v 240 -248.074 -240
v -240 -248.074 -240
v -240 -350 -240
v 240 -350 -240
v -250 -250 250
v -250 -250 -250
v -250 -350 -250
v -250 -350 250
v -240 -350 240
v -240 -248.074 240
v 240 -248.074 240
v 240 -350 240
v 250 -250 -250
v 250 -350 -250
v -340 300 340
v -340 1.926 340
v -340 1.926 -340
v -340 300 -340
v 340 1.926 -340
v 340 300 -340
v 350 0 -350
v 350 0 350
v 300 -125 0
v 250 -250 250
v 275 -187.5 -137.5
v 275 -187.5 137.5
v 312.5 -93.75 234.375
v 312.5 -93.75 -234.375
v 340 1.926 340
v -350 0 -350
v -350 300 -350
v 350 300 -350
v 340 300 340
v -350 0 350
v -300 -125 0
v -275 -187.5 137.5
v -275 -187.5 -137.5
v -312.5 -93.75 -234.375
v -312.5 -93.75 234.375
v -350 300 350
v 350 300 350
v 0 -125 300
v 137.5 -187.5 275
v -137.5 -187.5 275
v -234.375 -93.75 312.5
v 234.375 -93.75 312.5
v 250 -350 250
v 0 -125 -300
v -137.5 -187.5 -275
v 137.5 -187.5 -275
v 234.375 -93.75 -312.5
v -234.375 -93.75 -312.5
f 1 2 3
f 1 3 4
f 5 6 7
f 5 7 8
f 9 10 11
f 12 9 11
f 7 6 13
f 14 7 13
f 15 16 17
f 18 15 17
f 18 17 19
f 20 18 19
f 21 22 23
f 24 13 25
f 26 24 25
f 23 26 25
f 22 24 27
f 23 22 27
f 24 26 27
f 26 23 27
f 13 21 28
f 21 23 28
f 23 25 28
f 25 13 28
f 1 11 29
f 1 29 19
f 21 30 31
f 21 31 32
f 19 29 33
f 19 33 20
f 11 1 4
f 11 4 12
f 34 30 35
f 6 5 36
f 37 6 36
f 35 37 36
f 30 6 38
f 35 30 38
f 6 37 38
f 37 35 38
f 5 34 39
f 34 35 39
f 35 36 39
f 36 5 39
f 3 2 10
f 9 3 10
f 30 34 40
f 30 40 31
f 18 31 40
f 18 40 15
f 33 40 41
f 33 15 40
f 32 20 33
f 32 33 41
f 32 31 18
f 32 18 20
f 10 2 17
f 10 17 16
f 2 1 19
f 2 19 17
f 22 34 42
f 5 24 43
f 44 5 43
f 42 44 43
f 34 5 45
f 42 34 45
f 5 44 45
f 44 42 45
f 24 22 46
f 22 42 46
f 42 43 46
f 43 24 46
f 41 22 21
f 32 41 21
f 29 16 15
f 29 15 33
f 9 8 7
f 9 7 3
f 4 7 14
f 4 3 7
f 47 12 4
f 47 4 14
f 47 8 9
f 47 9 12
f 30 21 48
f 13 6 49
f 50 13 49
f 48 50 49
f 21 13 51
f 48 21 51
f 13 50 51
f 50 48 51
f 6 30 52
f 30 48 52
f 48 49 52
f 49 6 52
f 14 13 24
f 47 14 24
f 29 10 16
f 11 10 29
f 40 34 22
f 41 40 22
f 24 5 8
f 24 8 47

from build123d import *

# Parameters (mm, degrees)
SKETCH1_W           = 700
SKETCH1_H           = 700
BOSS_EXTRUDE1_DEPTH = 300
SKETCH2_W           = 500
SKETCH2_H           = 500
SKETCH3_W           = 500
SKETCH3_H           = 500
BOSS_EXTRUDE2_DEPTH = 100
SHELL1_T            = -10


with BuildPart() as part:
    # Sketch1 → Boss-Extrude1 (new body)
    with BuildSketch(Plane(origin=(0, 0, 0), x_dir=(1, 0, 0), z_dir=(0, 1, 0))):
        Rectangle(SKETCH1_W, SKETCH1_H)
    extrude(amount=BOSS_EXTRUDE1_DEPTH)

    # Sketch2 → section 1 of loft1
    with BuildSketch(Plane(origin=(0, -250, 0), x_dir=(-1, 0, 0), z_dir=(0, -1, 0)), mode=Mode.PRIVATE) as loft1_s1:
        Rectangle(SKETCH2_W, SKETCH2_H)
    # loft from a face of the part (loft1)
    loft([part.faces().sort_by_distance((0, 0, 0))[0], loft1_s1.sketch])

    # Sketch3 → Boss-Extrude2 (add)
    with BuildSketch(Plane.XZ.offset(250)):
        Rectangle(SKETCH3_W, SKETCH3_H)
    extrude(amount=BOSS_EXTRUDE2_DEPTH)

    # Shell1
    shell1_openings = [part.faces().sort_by_distance(p)[0] for p in [
        (0, 300, 0),
        (0, -350, 0),
    ]]
    offset(amount=SHELL1_T, openings=shell1_openings, kind=Kind.INTERSECTION)


solid = part.part
